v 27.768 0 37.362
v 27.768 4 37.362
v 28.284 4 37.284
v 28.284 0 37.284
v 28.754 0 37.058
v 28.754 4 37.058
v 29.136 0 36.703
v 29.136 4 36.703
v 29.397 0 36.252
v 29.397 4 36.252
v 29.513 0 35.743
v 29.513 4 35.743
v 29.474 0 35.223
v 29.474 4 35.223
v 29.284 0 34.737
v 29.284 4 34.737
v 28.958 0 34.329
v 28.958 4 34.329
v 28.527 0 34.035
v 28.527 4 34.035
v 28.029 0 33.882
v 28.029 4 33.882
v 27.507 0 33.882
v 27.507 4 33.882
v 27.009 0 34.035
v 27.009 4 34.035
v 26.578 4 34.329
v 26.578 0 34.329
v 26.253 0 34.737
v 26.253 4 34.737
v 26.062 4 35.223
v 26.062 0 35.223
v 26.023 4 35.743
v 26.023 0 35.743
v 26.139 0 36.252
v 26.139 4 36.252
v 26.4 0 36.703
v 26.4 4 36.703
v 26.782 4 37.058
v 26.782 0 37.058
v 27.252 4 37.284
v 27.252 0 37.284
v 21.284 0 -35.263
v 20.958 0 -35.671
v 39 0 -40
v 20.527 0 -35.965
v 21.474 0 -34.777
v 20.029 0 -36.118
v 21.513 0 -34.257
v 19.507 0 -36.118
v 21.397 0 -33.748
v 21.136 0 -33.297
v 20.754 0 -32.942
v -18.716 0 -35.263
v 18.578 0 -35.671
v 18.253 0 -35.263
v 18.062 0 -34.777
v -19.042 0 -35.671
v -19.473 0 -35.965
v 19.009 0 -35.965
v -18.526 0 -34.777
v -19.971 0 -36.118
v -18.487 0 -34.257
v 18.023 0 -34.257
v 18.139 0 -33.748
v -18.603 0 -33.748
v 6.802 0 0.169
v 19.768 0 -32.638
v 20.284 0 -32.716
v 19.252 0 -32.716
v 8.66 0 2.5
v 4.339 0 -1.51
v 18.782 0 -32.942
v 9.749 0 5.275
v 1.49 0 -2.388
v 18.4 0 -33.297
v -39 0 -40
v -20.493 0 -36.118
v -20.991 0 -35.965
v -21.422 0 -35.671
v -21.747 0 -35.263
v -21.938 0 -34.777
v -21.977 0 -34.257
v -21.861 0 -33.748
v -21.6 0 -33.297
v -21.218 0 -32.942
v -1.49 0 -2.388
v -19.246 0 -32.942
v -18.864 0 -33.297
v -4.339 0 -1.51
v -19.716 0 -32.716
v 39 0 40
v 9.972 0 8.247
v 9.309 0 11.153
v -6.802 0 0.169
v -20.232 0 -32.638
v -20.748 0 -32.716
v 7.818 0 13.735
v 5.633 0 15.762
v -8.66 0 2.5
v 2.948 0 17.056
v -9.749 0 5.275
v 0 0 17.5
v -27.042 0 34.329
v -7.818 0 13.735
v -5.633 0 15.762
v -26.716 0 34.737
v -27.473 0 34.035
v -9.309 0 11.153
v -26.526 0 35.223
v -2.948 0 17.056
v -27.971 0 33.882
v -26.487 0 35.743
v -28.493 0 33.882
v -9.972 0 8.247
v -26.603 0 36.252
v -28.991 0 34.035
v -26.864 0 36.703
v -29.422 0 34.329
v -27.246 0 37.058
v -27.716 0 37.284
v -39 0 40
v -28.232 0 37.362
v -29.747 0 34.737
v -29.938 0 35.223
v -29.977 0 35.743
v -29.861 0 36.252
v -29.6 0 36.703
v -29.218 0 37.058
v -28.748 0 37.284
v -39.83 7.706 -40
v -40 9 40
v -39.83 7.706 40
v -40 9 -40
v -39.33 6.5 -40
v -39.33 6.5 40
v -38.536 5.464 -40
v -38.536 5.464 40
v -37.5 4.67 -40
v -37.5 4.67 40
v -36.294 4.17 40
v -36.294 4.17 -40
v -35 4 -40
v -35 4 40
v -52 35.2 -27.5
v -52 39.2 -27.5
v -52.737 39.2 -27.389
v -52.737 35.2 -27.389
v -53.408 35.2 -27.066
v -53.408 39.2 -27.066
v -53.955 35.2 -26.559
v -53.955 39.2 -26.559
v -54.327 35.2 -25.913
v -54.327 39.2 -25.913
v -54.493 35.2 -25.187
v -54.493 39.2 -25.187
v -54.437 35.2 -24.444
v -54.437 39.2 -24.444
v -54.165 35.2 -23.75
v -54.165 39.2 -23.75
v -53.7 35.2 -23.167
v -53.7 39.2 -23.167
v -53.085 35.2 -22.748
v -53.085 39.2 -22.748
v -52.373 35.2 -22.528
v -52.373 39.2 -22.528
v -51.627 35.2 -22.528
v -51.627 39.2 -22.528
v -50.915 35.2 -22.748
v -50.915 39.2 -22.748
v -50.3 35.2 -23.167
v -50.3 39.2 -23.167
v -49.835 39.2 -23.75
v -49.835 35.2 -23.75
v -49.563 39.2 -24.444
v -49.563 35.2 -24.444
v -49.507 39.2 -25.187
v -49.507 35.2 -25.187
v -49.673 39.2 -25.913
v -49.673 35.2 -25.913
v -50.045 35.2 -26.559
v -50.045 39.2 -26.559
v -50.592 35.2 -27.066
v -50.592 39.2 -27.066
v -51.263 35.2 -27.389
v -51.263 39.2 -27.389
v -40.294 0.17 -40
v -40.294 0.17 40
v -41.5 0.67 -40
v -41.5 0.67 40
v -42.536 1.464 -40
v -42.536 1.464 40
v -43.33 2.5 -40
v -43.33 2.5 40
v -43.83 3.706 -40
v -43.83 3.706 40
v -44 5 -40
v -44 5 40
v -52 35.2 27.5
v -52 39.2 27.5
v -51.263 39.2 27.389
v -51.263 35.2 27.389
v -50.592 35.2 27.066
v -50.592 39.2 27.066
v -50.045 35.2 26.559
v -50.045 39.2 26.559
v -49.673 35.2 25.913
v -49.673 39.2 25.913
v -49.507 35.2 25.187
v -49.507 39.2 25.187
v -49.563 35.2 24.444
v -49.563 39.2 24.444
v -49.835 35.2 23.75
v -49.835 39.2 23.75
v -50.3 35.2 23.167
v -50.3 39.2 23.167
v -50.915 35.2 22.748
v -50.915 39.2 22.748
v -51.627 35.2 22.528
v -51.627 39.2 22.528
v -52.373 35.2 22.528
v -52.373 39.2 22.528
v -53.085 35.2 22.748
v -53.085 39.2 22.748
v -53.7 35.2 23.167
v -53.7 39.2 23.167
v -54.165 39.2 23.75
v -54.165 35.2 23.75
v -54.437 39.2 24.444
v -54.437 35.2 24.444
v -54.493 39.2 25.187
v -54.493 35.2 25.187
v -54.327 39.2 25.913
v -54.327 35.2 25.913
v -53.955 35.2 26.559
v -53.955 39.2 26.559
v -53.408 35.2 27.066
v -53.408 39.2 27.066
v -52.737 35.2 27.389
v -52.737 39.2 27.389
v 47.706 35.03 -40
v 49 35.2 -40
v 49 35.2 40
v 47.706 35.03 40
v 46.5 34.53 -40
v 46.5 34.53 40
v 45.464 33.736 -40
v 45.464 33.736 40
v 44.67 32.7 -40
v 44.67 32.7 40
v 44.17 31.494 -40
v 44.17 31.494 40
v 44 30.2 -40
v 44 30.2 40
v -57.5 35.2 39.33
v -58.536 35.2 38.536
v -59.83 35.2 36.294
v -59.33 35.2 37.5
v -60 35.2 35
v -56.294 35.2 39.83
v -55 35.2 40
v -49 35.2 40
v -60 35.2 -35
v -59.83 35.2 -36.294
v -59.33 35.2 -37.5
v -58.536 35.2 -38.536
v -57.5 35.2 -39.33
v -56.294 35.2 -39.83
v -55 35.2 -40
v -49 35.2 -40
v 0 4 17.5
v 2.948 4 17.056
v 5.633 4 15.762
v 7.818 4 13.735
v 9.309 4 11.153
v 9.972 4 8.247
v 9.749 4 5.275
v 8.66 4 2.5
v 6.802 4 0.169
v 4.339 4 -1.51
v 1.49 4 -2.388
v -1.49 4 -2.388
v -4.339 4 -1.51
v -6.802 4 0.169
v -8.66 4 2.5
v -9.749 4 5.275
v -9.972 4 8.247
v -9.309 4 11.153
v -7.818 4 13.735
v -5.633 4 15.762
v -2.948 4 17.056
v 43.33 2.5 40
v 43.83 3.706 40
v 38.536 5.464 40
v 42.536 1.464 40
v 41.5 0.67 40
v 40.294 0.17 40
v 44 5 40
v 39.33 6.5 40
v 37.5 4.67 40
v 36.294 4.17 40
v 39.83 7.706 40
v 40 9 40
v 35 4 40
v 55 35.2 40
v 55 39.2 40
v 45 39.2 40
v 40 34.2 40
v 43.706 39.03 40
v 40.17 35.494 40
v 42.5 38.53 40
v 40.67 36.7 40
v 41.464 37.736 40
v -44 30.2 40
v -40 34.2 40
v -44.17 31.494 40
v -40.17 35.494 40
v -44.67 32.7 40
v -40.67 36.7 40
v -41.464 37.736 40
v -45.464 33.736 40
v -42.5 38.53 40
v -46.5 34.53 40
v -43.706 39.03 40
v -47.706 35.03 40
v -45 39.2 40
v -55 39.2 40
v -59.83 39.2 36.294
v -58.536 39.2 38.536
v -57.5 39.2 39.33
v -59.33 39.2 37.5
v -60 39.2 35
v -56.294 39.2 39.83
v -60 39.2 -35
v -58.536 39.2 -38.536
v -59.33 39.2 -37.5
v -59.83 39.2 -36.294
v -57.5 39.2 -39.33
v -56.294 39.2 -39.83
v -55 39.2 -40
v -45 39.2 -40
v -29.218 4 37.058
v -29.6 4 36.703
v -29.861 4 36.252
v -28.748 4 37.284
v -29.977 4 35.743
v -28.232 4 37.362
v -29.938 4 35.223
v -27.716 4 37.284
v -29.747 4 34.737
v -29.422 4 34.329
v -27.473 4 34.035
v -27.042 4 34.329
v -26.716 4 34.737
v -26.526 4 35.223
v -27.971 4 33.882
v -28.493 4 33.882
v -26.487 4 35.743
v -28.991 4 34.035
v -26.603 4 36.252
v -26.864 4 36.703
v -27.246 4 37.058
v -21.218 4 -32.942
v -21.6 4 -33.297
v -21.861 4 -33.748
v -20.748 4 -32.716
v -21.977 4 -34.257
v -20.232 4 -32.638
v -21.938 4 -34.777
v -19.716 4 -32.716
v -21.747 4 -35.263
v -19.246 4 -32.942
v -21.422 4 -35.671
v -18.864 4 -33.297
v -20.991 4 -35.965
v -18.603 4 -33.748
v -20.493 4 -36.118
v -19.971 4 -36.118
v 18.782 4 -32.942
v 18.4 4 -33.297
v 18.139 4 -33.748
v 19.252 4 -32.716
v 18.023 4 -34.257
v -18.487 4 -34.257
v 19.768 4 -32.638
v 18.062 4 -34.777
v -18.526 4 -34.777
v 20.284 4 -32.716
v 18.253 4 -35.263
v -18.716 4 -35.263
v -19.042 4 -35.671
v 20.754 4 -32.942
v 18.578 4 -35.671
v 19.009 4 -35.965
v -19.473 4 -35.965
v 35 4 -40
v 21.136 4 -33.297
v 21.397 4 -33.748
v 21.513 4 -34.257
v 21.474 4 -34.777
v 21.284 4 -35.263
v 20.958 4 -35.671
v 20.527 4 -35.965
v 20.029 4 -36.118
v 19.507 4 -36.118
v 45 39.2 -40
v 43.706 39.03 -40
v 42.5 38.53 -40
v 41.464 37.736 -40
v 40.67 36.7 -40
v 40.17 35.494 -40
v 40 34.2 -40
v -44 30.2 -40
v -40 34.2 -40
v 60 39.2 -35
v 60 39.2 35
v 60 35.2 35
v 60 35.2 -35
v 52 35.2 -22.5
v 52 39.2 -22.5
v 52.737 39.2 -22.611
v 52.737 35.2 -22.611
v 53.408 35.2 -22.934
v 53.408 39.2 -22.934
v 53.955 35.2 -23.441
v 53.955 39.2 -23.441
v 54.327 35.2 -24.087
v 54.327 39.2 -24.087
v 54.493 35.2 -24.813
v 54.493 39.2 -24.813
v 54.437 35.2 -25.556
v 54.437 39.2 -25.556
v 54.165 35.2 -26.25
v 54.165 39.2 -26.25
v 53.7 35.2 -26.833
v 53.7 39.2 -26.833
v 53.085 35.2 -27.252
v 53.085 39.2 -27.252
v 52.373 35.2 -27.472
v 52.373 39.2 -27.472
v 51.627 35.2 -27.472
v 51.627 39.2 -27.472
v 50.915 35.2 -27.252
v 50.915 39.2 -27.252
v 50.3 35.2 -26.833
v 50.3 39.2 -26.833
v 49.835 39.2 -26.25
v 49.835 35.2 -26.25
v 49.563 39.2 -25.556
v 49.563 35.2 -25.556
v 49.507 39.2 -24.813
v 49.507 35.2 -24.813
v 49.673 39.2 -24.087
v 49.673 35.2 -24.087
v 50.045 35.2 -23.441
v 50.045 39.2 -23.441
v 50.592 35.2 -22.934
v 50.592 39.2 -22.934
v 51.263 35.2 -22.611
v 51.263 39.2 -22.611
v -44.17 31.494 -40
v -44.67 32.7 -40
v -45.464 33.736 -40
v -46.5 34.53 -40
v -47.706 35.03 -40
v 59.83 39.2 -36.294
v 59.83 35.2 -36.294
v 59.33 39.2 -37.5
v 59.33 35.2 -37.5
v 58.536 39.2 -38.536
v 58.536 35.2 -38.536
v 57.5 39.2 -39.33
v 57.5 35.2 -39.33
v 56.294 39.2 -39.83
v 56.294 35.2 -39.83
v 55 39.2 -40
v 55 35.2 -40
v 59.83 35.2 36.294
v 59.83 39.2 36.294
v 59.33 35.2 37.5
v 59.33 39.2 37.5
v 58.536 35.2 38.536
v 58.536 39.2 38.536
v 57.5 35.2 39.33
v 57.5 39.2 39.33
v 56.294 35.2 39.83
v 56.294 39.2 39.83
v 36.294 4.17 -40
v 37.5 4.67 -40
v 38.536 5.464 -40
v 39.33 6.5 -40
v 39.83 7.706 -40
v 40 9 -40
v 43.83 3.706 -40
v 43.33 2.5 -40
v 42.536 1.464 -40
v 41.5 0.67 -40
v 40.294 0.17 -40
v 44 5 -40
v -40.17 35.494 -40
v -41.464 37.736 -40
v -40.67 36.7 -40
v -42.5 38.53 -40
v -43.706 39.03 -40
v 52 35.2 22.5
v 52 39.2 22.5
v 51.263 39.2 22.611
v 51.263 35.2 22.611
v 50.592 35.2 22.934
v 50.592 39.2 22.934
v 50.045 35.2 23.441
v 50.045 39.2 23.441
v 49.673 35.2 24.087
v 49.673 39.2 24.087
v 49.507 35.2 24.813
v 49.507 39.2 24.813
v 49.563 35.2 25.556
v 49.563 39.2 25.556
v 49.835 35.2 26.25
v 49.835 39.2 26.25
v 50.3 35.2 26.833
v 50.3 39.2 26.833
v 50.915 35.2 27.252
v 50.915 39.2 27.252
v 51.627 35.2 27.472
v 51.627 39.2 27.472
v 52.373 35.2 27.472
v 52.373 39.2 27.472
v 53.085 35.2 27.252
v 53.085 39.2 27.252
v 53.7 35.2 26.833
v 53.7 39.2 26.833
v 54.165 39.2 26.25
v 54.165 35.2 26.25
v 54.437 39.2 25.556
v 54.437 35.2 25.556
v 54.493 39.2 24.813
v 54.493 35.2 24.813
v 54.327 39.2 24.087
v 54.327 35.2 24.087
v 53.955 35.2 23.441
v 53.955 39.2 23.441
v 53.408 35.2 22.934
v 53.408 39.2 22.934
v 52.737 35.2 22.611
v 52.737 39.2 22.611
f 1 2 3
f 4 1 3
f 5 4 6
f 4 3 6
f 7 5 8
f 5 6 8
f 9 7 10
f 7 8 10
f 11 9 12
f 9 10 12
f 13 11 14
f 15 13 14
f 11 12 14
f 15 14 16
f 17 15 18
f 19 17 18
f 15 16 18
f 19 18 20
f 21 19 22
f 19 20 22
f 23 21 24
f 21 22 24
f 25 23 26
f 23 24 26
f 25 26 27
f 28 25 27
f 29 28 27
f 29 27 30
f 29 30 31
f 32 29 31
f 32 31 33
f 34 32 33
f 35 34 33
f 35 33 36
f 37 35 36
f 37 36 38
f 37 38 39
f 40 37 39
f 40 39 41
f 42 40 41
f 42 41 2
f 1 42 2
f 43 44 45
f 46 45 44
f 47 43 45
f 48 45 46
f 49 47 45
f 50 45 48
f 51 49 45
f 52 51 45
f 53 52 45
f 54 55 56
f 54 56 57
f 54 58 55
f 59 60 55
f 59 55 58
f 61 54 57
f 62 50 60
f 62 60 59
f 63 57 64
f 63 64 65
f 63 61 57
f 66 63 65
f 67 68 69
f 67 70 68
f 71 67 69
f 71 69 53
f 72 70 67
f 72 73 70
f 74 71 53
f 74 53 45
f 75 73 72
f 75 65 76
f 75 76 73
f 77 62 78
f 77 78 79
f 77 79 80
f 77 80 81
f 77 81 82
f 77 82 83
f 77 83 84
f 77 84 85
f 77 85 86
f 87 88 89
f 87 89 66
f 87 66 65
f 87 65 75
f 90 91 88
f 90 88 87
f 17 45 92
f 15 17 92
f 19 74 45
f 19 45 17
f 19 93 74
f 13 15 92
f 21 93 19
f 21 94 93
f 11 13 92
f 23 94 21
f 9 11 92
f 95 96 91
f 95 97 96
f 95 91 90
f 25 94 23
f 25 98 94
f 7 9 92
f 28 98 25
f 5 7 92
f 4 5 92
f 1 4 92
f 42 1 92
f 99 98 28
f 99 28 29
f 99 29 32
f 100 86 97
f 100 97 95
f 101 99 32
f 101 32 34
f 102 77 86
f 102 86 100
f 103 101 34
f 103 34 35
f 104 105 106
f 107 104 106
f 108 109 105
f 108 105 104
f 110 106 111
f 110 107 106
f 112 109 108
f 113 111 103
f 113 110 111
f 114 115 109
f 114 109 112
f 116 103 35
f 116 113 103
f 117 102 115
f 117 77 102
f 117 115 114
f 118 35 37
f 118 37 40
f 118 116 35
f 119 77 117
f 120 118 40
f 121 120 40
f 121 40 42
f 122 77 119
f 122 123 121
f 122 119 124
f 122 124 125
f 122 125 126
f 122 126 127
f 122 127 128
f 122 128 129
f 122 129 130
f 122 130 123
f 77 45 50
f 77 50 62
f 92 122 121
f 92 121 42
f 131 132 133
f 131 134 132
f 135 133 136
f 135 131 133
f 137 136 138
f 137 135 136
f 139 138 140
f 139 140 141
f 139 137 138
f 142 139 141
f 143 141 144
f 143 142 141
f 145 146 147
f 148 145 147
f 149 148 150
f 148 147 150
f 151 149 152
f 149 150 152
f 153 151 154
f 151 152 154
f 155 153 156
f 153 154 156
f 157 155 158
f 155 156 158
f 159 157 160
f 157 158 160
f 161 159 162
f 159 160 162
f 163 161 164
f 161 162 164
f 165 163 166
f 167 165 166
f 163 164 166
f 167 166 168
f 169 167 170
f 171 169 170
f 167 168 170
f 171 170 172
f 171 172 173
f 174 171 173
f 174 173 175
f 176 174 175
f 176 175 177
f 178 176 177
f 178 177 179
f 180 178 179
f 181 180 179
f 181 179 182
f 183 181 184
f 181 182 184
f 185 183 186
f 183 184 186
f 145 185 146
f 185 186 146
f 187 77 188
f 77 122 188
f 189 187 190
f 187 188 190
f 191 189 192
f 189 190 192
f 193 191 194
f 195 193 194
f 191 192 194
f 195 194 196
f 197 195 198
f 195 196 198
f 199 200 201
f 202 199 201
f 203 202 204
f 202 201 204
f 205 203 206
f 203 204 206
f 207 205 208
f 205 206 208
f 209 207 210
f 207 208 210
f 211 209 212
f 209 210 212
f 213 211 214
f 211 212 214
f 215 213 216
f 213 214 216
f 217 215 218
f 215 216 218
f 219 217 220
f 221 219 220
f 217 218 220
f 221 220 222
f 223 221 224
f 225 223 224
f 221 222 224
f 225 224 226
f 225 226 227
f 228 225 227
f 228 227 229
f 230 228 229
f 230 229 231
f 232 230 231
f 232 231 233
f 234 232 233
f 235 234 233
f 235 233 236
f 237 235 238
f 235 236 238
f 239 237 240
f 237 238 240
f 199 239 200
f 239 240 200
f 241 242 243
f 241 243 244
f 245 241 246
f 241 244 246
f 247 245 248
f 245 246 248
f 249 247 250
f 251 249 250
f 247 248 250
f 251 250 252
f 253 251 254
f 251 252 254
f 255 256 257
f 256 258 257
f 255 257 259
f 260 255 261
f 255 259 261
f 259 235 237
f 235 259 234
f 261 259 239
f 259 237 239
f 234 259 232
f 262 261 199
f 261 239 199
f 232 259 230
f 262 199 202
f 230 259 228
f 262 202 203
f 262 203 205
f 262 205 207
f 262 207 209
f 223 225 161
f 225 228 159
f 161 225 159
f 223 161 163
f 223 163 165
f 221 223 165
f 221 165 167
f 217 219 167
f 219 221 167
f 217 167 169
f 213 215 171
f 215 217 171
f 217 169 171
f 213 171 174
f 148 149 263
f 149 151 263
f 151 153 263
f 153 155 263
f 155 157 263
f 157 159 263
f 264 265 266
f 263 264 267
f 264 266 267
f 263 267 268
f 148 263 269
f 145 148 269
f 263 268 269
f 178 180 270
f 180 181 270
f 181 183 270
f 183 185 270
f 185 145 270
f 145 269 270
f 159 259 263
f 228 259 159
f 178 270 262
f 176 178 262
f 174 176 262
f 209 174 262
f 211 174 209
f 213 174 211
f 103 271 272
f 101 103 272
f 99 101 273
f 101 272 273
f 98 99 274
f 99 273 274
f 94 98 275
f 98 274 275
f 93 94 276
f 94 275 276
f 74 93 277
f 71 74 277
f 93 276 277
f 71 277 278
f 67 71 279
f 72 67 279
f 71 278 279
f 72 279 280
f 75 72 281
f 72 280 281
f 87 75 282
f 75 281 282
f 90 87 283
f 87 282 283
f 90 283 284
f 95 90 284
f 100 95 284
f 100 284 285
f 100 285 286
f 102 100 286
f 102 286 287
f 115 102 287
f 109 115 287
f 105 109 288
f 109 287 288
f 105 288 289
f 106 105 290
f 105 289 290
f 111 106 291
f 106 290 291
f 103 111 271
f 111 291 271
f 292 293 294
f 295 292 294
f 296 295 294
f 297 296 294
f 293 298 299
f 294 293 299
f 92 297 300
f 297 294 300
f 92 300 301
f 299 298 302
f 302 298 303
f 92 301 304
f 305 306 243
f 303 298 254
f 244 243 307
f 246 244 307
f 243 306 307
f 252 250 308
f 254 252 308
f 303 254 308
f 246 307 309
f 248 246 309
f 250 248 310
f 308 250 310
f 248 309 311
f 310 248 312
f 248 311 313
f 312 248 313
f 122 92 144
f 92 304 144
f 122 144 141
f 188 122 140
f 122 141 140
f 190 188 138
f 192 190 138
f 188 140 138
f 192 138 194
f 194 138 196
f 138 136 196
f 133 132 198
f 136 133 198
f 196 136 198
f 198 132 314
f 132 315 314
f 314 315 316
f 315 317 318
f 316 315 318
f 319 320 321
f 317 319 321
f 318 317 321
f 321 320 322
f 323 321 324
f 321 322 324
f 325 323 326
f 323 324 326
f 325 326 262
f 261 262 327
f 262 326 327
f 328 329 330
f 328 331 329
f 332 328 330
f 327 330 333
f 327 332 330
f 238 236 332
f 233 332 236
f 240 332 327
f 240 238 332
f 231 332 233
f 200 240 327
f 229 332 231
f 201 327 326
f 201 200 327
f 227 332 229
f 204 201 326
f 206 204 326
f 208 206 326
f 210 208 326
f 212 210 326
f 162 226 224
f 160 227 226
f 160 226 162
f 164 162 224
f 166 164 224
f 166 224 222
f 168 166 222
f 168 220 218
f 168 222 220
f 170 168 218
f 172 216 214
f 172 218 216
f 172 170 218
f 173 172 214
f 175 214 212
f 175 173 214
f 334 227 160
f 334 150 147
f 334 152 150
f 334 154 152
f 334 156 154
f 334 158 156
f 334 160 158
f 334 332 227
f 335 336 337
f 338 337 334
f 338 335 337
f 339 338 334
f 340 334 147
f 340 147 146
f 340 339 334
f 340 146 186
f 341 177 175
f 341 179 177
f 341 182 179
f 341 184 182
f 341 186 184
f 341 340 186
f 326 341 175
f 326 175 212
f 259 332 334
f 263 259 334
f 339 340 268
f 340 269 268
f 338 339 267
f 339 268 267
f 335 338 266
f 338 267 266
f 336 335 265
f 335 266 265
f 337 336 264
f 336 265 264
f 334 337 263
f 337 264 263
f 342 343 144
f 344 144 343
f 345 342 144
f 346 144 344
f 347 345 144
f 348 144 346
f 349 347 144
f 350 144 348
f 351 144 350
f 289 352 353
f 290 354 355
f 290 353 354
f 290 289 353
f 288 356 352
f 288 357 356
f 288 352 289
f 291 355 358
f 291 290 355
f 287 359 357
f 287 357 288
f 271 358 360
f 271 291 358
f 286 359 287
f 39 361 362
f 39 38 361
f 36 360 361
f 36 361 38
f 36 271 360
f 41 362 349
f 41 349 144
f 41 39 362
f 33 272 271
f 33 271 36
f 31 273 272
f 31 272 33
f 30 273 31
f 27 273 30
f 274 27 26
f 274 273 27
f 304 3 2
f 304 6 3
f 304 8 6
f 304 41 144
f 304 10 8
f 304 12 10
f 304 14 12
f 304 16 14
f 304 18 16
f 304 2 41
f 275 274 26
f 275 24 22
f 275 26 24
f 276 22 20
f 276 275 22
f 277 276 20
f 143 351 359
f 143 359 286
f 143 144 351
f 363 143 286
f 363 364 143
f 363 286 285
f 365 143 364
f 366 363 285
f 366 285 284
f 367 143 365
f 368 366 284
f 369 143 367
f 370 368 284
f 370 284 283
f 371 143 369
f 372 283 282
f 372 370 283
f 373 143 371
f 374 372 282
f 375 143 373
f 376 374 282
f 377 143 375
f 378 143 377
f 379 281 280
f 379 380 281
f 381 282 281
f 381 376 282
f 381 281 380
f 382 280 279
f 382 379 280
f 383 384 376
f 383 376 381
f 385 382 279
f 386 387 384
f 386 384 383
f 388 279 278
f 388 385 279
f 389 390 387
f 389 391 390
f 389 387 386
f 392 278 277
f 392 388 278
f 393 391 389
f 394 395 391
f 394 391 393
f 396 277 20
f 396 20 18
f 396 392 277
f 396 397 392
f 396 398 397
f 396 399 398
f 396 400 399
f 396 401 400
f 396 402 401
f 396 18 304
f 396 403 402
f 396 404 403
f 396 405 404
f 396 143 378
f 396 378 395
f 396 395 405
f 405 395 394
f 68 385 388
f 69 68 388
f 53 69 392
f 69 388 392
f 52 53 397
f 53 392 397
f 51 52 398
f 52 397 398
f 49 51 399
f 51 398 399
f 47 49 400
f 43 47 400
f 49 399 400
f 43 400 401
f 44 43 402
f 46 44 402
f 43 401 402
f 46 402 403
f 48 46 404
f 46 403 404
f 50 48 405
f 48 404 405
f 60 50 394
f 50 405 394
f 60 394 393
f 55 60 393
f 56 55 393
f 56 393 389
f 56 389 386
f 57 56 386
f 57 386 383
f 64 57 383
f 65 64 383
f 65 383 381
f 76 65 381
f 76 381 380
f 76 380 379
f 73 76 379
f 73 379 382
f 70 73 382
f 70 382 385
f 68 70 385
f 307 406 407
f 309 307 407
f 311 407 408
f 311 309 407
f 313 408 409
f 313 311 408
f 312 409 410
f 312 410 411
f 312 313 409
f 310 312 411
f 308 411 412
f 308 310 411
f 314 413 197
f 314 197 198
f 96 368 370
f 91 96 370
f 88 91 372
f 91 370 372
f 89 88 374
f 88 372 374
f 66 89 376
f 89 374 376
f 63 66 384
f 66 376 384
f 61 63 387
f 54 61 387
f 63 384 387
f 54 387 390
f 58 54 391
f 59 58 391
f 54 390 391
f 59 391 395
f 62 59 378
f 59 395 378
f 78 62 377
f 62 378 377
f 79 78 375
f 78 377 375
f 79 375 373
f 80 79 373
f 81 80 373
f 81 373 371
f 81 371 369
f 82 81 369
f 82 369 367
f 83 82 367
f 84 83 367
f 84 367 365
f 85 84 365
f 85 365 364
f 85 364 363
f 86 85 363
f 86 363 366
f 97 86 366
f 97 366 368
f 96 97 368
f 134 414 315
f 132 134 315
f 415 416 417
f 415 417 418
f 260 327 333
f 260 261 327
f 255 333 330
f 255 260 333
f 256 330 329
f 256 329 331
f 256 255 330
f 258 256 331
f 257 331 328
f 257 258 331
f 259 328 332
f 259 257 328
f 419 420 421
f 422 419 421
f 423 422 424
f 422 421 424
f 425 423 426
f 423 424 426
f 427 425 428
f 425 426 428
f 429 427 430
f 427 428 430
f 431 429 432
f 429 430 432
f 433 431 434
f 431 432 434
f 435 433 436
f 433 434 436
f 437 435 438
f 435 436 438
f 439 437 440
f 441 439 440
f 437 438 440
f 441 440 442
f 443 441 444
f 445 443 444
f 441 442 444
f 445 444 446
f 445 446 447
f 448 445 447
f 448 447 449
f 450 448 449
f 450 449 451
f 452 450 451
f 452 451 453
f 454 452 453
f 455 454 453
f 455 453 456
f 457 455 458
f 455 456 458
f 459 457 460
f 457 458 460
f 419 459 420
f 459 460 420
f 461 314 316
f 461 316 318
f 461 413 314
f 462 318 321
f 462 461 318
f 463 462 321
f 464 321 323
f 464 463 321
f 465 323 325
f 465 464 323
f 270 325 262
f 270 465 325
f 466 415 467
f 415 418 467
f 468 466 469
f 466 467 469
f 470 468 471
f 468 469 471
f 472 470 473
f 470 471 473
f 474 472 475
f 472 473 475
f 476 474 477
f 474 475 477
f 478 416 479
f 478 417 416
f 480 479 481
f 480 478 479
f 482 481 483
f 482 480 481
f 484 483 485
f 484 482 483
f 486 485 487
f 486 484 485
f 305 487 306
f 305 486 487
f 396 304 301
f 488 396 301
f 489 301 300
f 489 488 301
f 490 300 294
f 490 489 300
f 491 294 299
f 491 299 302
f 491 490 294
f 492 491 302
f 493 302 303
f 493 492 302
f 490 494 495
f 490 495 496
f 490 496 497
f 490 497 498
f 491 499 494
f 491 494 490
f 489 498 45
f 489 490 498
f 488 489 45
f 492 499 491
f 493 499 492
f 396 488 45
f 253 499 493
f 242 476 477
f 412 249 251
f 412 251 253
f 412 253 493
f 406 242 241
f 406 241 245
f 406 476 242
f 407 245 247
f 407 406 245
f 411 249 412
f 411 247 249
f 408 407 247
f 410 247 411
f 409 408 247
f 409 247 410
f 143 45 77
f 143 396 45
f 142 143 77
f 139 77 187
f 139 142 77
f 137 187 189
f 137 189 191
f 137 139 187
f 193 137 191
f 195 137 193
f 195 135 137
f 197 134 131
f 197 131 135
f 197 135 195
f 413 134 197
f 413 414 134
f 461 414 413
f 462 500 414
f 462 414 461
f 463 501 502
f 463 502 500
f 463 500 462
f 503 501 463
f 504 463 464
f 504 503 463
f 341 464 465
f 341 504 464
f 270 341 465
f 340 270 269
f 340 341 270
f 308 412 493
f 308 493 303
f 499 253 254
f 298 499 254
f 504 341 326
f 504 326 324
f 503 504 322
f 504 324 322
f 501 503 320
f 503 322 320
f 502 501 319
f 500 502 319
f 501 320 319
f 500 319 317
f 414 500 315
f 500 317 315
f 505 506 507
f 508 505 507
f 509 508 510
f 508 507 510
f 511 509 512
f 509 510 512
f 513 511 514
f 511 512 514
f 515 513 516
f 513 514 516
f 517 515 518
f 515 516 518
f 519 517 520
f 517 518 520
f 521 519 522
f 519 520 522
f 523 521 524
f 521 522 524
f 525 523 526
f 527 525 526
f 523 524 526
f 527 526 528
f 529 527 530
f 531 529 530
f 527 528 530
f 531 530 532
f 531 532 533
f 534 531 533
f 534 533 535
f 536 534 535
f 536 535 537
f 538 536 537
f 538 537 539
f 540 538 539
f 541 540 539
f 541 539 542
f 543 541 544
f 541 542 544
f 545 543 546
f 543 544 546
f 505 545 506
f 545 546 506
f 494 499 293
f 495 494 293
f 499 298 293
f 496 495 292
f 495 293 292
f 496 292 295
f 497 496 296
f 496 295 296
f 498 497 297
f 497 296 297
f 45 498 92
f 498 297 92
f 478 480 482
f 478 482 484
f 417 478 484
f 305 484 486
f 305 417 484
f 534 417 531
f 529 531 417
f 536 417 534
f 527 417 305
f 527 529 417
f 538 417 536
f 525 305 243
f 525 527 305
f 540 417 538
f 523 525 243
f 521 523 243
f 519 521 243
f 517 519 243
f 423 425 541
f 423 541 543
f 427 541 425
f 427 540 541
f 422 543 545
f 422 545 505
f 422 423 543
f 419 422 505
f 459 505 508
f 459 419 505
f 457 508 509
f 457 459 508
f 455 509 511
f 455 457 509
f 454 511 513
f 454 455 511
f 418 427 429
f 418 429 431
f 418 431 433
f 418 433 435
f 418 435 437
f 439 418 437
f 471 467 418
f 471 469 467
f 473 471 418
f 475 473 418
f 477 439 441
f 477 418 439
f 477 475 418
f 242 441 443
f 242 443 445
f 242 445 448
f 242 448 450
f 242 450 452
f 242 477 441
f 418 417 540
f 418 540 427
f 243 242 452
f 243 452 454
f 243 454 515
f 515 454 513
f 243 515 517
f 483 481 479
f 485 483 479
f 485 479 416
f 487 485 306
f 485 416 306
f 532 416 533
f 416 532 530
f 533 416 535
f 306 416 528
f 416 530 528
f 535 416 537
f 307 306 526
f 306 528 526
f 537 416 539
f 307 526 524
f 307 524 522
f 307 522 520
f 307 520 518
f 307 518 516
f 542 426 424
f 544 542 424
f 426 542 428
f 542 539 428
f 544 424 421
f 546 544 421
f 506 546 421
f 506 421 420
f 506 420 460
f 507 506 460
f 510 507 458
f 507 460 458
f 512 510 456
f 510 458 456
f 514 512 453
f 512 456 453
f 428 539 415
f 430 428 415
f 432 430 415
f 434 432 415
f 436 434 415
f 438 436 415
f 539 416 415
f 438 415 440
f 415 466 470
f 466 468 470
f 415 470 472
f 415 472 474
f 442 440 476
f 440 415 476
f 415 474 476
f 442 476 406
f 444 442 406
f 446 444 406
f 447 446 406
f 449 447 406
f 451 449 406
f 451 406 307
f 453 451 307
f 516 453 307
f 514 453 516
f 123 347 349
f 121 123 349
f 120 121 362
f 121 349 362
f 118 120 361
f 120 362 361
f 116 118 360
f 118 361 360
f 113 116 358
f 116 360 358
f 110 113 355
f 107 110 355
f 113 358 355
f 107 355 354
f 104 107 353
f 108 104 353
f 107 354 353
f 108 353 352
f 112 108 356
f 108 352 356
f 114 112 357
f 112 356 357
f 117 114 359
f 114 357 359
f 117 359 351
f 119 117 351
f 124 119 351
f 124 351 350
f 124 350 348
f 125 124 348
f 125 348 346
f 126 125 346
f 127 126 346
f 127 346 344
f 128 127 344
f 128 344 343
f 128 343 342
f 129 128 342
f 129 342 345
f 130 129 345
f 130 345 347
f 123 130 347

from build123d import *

# Parameters (mm, degrees)
SKETCH2_W           = 80
SKETCH2_H           = 80
BOSS_EXTRUDE1_DEPTH = 4
SKETCH3_R           = 10
CUT_EXTRUDE1_DEPTH  = 4
SKETCH4_R           = 1.75
CUT_EXTRUDE2_DEPTH  = 10
SKETCH7_W           = 80
SKETCH7_H           = 39.2
BOSS_EXTRUDE3_DEPTH = 4
SKETCH8_W           = 20
SKETCH8_H           = 80
BOSS_EXTRUDE4_DEPTH = 4
SKETCH9_R           = 2.5
CUT_EXTRUDE3_DEPTH  = 4
FILLET1_R           = 5


with BuildPart() as part:
    # Sketch2 → Boss-Extrude1 (new body)
    with BuildSketch(Plane(origin=(0, 0, 0), x_dir=(1, 0, 0), z_dir=(0, 1, 0))):
        Rectangle(SKETCH2_W, SKETCH2_H)
    extrude(amount=BOSS_EXTRUDE1_DEPTH)

    # Sketch3 → Cut-Extrude1 (cut)
    with BuildSketch(Plane(origin=(0, 4, 0), x_dir=(1, 0, 0), z_dir=(0, 1, 0))):
        with Locations(Location((0, -7.5, 0), (0, 0, 270))):
            Circle(SKETCH3_R)
    extrude(amount=-CUT_EXTRUDE1_DEPTH, mode=Mode.SUBTRACT)

    # Sketch4 → Cut-Extrude2 (cut)
    with BuildSketch(Plane(origin=(0, 4, 0), x_dir=(1, 0, 0), z_dir=(0, 1, 0))):
        with Locations(Location((-28.231866882, -35.612184397, 0), (0, 0, 270))):
            Circle(SKETCH4_R)
        with Locations(Location((27.768133118, -35.612184397, 0), (0, 0, 270))):
            Circle(SKETCH4_R)
        with Locations(Location((19.768133118, 34.387815603, 0), (0, 0, 270))):
            Circle(SKETCH4_R)
        with Locations(Location((-20.231866882, 34.387815603, 0), (0, 0, 270))):
            Circle(SKETCH4_R)
    extrude(amount=-CUT_EXTRUDE2_DEPTH, mode=Mode.SUBTRACT)

    # Sketch7 → Boss-Extrude3 (add)
    with BuildSketch(Plane.ZY.offset(40)):
        with Locations((0, 19.6)):
            Rectangle(SKETCH7_W, SKETCH7_H)
    boss_extrude3 = extrude(amount=BOSS_EXTRUDE3_DEPTH)

    # Mirror2: Boss-Extrude3 across plane
    add(boss_extrude3.mirror(Plane(origin=(0, 0, 0), x_dir=(0, 0, 1), z_dir=(1, 0, 0))))

    # Sketch8 → Boss-Extrude4 (add)
    with BuildSketch(Plane(origin=(0, 39.2, 0), x_dir=(1, 0, 0), z_dir=(0, 1, 0))):
        with Locations((-50, 0)):
            Rectangle(SKETCH8_W, SKETCH8_H)
    boss_extrude4 = extrude(amount=-BOSS_EXTRUDE4_DEPTH)

    # Mirror3: Boss-Extrude4 across plane
    add(boss_extrude4.mirror(Plane(origin=(0, 0, 0), x_dir=(0, 0, 1), z_dir=(1, 0, 0))))

    # Sketch9 → Cut-Extrude3 (cut)
    with BuildSketch(Plane(origin=(0, 39.2, 0), x_dir=(1, 0, 0), z_dir=(0, 1, 0))):
        with Locations(Location((-52, -25, 0), (0, 0, 270))):
            Circle(SKETCH9_R)
        with Locations(Location((-52, 25, 0), (0, 0, 90))):
            Circle(SKETCH9_R)
        with Locations(Location((52, 25, 0), (0, 0, 270))):
            Circle(SKETCH9_R)
        with Locations(Location((52, -25, 0), (0, 0, 90))):
            Circle(SKETCH9_R)
    extrude(amount=-CUT_EXTRUDE3_DEPTH, mode=Mode.SUBTRACT)

    # Fillet1
    fillet1_edges = [part.edges().sort_by_distance(p)[0] for p in [
        (40, 4, 0),
        (-40, 4, 0),
        (-40, 39.2, 0),
        (-44, 0, 0),
        (40, 39.2, 0),
        (44, 0, 0),
        (-44, 35.2, 0),
        (-60, 37.2, -40),
        (-60, 37.2, 40),
        (44, 35.2, 0),
        (60, 37.2, 40),
        (60, 37.2, -40),
    ]]
    fillet(fillet1_edges, radius=FILLET1_R)


solid = part.part
